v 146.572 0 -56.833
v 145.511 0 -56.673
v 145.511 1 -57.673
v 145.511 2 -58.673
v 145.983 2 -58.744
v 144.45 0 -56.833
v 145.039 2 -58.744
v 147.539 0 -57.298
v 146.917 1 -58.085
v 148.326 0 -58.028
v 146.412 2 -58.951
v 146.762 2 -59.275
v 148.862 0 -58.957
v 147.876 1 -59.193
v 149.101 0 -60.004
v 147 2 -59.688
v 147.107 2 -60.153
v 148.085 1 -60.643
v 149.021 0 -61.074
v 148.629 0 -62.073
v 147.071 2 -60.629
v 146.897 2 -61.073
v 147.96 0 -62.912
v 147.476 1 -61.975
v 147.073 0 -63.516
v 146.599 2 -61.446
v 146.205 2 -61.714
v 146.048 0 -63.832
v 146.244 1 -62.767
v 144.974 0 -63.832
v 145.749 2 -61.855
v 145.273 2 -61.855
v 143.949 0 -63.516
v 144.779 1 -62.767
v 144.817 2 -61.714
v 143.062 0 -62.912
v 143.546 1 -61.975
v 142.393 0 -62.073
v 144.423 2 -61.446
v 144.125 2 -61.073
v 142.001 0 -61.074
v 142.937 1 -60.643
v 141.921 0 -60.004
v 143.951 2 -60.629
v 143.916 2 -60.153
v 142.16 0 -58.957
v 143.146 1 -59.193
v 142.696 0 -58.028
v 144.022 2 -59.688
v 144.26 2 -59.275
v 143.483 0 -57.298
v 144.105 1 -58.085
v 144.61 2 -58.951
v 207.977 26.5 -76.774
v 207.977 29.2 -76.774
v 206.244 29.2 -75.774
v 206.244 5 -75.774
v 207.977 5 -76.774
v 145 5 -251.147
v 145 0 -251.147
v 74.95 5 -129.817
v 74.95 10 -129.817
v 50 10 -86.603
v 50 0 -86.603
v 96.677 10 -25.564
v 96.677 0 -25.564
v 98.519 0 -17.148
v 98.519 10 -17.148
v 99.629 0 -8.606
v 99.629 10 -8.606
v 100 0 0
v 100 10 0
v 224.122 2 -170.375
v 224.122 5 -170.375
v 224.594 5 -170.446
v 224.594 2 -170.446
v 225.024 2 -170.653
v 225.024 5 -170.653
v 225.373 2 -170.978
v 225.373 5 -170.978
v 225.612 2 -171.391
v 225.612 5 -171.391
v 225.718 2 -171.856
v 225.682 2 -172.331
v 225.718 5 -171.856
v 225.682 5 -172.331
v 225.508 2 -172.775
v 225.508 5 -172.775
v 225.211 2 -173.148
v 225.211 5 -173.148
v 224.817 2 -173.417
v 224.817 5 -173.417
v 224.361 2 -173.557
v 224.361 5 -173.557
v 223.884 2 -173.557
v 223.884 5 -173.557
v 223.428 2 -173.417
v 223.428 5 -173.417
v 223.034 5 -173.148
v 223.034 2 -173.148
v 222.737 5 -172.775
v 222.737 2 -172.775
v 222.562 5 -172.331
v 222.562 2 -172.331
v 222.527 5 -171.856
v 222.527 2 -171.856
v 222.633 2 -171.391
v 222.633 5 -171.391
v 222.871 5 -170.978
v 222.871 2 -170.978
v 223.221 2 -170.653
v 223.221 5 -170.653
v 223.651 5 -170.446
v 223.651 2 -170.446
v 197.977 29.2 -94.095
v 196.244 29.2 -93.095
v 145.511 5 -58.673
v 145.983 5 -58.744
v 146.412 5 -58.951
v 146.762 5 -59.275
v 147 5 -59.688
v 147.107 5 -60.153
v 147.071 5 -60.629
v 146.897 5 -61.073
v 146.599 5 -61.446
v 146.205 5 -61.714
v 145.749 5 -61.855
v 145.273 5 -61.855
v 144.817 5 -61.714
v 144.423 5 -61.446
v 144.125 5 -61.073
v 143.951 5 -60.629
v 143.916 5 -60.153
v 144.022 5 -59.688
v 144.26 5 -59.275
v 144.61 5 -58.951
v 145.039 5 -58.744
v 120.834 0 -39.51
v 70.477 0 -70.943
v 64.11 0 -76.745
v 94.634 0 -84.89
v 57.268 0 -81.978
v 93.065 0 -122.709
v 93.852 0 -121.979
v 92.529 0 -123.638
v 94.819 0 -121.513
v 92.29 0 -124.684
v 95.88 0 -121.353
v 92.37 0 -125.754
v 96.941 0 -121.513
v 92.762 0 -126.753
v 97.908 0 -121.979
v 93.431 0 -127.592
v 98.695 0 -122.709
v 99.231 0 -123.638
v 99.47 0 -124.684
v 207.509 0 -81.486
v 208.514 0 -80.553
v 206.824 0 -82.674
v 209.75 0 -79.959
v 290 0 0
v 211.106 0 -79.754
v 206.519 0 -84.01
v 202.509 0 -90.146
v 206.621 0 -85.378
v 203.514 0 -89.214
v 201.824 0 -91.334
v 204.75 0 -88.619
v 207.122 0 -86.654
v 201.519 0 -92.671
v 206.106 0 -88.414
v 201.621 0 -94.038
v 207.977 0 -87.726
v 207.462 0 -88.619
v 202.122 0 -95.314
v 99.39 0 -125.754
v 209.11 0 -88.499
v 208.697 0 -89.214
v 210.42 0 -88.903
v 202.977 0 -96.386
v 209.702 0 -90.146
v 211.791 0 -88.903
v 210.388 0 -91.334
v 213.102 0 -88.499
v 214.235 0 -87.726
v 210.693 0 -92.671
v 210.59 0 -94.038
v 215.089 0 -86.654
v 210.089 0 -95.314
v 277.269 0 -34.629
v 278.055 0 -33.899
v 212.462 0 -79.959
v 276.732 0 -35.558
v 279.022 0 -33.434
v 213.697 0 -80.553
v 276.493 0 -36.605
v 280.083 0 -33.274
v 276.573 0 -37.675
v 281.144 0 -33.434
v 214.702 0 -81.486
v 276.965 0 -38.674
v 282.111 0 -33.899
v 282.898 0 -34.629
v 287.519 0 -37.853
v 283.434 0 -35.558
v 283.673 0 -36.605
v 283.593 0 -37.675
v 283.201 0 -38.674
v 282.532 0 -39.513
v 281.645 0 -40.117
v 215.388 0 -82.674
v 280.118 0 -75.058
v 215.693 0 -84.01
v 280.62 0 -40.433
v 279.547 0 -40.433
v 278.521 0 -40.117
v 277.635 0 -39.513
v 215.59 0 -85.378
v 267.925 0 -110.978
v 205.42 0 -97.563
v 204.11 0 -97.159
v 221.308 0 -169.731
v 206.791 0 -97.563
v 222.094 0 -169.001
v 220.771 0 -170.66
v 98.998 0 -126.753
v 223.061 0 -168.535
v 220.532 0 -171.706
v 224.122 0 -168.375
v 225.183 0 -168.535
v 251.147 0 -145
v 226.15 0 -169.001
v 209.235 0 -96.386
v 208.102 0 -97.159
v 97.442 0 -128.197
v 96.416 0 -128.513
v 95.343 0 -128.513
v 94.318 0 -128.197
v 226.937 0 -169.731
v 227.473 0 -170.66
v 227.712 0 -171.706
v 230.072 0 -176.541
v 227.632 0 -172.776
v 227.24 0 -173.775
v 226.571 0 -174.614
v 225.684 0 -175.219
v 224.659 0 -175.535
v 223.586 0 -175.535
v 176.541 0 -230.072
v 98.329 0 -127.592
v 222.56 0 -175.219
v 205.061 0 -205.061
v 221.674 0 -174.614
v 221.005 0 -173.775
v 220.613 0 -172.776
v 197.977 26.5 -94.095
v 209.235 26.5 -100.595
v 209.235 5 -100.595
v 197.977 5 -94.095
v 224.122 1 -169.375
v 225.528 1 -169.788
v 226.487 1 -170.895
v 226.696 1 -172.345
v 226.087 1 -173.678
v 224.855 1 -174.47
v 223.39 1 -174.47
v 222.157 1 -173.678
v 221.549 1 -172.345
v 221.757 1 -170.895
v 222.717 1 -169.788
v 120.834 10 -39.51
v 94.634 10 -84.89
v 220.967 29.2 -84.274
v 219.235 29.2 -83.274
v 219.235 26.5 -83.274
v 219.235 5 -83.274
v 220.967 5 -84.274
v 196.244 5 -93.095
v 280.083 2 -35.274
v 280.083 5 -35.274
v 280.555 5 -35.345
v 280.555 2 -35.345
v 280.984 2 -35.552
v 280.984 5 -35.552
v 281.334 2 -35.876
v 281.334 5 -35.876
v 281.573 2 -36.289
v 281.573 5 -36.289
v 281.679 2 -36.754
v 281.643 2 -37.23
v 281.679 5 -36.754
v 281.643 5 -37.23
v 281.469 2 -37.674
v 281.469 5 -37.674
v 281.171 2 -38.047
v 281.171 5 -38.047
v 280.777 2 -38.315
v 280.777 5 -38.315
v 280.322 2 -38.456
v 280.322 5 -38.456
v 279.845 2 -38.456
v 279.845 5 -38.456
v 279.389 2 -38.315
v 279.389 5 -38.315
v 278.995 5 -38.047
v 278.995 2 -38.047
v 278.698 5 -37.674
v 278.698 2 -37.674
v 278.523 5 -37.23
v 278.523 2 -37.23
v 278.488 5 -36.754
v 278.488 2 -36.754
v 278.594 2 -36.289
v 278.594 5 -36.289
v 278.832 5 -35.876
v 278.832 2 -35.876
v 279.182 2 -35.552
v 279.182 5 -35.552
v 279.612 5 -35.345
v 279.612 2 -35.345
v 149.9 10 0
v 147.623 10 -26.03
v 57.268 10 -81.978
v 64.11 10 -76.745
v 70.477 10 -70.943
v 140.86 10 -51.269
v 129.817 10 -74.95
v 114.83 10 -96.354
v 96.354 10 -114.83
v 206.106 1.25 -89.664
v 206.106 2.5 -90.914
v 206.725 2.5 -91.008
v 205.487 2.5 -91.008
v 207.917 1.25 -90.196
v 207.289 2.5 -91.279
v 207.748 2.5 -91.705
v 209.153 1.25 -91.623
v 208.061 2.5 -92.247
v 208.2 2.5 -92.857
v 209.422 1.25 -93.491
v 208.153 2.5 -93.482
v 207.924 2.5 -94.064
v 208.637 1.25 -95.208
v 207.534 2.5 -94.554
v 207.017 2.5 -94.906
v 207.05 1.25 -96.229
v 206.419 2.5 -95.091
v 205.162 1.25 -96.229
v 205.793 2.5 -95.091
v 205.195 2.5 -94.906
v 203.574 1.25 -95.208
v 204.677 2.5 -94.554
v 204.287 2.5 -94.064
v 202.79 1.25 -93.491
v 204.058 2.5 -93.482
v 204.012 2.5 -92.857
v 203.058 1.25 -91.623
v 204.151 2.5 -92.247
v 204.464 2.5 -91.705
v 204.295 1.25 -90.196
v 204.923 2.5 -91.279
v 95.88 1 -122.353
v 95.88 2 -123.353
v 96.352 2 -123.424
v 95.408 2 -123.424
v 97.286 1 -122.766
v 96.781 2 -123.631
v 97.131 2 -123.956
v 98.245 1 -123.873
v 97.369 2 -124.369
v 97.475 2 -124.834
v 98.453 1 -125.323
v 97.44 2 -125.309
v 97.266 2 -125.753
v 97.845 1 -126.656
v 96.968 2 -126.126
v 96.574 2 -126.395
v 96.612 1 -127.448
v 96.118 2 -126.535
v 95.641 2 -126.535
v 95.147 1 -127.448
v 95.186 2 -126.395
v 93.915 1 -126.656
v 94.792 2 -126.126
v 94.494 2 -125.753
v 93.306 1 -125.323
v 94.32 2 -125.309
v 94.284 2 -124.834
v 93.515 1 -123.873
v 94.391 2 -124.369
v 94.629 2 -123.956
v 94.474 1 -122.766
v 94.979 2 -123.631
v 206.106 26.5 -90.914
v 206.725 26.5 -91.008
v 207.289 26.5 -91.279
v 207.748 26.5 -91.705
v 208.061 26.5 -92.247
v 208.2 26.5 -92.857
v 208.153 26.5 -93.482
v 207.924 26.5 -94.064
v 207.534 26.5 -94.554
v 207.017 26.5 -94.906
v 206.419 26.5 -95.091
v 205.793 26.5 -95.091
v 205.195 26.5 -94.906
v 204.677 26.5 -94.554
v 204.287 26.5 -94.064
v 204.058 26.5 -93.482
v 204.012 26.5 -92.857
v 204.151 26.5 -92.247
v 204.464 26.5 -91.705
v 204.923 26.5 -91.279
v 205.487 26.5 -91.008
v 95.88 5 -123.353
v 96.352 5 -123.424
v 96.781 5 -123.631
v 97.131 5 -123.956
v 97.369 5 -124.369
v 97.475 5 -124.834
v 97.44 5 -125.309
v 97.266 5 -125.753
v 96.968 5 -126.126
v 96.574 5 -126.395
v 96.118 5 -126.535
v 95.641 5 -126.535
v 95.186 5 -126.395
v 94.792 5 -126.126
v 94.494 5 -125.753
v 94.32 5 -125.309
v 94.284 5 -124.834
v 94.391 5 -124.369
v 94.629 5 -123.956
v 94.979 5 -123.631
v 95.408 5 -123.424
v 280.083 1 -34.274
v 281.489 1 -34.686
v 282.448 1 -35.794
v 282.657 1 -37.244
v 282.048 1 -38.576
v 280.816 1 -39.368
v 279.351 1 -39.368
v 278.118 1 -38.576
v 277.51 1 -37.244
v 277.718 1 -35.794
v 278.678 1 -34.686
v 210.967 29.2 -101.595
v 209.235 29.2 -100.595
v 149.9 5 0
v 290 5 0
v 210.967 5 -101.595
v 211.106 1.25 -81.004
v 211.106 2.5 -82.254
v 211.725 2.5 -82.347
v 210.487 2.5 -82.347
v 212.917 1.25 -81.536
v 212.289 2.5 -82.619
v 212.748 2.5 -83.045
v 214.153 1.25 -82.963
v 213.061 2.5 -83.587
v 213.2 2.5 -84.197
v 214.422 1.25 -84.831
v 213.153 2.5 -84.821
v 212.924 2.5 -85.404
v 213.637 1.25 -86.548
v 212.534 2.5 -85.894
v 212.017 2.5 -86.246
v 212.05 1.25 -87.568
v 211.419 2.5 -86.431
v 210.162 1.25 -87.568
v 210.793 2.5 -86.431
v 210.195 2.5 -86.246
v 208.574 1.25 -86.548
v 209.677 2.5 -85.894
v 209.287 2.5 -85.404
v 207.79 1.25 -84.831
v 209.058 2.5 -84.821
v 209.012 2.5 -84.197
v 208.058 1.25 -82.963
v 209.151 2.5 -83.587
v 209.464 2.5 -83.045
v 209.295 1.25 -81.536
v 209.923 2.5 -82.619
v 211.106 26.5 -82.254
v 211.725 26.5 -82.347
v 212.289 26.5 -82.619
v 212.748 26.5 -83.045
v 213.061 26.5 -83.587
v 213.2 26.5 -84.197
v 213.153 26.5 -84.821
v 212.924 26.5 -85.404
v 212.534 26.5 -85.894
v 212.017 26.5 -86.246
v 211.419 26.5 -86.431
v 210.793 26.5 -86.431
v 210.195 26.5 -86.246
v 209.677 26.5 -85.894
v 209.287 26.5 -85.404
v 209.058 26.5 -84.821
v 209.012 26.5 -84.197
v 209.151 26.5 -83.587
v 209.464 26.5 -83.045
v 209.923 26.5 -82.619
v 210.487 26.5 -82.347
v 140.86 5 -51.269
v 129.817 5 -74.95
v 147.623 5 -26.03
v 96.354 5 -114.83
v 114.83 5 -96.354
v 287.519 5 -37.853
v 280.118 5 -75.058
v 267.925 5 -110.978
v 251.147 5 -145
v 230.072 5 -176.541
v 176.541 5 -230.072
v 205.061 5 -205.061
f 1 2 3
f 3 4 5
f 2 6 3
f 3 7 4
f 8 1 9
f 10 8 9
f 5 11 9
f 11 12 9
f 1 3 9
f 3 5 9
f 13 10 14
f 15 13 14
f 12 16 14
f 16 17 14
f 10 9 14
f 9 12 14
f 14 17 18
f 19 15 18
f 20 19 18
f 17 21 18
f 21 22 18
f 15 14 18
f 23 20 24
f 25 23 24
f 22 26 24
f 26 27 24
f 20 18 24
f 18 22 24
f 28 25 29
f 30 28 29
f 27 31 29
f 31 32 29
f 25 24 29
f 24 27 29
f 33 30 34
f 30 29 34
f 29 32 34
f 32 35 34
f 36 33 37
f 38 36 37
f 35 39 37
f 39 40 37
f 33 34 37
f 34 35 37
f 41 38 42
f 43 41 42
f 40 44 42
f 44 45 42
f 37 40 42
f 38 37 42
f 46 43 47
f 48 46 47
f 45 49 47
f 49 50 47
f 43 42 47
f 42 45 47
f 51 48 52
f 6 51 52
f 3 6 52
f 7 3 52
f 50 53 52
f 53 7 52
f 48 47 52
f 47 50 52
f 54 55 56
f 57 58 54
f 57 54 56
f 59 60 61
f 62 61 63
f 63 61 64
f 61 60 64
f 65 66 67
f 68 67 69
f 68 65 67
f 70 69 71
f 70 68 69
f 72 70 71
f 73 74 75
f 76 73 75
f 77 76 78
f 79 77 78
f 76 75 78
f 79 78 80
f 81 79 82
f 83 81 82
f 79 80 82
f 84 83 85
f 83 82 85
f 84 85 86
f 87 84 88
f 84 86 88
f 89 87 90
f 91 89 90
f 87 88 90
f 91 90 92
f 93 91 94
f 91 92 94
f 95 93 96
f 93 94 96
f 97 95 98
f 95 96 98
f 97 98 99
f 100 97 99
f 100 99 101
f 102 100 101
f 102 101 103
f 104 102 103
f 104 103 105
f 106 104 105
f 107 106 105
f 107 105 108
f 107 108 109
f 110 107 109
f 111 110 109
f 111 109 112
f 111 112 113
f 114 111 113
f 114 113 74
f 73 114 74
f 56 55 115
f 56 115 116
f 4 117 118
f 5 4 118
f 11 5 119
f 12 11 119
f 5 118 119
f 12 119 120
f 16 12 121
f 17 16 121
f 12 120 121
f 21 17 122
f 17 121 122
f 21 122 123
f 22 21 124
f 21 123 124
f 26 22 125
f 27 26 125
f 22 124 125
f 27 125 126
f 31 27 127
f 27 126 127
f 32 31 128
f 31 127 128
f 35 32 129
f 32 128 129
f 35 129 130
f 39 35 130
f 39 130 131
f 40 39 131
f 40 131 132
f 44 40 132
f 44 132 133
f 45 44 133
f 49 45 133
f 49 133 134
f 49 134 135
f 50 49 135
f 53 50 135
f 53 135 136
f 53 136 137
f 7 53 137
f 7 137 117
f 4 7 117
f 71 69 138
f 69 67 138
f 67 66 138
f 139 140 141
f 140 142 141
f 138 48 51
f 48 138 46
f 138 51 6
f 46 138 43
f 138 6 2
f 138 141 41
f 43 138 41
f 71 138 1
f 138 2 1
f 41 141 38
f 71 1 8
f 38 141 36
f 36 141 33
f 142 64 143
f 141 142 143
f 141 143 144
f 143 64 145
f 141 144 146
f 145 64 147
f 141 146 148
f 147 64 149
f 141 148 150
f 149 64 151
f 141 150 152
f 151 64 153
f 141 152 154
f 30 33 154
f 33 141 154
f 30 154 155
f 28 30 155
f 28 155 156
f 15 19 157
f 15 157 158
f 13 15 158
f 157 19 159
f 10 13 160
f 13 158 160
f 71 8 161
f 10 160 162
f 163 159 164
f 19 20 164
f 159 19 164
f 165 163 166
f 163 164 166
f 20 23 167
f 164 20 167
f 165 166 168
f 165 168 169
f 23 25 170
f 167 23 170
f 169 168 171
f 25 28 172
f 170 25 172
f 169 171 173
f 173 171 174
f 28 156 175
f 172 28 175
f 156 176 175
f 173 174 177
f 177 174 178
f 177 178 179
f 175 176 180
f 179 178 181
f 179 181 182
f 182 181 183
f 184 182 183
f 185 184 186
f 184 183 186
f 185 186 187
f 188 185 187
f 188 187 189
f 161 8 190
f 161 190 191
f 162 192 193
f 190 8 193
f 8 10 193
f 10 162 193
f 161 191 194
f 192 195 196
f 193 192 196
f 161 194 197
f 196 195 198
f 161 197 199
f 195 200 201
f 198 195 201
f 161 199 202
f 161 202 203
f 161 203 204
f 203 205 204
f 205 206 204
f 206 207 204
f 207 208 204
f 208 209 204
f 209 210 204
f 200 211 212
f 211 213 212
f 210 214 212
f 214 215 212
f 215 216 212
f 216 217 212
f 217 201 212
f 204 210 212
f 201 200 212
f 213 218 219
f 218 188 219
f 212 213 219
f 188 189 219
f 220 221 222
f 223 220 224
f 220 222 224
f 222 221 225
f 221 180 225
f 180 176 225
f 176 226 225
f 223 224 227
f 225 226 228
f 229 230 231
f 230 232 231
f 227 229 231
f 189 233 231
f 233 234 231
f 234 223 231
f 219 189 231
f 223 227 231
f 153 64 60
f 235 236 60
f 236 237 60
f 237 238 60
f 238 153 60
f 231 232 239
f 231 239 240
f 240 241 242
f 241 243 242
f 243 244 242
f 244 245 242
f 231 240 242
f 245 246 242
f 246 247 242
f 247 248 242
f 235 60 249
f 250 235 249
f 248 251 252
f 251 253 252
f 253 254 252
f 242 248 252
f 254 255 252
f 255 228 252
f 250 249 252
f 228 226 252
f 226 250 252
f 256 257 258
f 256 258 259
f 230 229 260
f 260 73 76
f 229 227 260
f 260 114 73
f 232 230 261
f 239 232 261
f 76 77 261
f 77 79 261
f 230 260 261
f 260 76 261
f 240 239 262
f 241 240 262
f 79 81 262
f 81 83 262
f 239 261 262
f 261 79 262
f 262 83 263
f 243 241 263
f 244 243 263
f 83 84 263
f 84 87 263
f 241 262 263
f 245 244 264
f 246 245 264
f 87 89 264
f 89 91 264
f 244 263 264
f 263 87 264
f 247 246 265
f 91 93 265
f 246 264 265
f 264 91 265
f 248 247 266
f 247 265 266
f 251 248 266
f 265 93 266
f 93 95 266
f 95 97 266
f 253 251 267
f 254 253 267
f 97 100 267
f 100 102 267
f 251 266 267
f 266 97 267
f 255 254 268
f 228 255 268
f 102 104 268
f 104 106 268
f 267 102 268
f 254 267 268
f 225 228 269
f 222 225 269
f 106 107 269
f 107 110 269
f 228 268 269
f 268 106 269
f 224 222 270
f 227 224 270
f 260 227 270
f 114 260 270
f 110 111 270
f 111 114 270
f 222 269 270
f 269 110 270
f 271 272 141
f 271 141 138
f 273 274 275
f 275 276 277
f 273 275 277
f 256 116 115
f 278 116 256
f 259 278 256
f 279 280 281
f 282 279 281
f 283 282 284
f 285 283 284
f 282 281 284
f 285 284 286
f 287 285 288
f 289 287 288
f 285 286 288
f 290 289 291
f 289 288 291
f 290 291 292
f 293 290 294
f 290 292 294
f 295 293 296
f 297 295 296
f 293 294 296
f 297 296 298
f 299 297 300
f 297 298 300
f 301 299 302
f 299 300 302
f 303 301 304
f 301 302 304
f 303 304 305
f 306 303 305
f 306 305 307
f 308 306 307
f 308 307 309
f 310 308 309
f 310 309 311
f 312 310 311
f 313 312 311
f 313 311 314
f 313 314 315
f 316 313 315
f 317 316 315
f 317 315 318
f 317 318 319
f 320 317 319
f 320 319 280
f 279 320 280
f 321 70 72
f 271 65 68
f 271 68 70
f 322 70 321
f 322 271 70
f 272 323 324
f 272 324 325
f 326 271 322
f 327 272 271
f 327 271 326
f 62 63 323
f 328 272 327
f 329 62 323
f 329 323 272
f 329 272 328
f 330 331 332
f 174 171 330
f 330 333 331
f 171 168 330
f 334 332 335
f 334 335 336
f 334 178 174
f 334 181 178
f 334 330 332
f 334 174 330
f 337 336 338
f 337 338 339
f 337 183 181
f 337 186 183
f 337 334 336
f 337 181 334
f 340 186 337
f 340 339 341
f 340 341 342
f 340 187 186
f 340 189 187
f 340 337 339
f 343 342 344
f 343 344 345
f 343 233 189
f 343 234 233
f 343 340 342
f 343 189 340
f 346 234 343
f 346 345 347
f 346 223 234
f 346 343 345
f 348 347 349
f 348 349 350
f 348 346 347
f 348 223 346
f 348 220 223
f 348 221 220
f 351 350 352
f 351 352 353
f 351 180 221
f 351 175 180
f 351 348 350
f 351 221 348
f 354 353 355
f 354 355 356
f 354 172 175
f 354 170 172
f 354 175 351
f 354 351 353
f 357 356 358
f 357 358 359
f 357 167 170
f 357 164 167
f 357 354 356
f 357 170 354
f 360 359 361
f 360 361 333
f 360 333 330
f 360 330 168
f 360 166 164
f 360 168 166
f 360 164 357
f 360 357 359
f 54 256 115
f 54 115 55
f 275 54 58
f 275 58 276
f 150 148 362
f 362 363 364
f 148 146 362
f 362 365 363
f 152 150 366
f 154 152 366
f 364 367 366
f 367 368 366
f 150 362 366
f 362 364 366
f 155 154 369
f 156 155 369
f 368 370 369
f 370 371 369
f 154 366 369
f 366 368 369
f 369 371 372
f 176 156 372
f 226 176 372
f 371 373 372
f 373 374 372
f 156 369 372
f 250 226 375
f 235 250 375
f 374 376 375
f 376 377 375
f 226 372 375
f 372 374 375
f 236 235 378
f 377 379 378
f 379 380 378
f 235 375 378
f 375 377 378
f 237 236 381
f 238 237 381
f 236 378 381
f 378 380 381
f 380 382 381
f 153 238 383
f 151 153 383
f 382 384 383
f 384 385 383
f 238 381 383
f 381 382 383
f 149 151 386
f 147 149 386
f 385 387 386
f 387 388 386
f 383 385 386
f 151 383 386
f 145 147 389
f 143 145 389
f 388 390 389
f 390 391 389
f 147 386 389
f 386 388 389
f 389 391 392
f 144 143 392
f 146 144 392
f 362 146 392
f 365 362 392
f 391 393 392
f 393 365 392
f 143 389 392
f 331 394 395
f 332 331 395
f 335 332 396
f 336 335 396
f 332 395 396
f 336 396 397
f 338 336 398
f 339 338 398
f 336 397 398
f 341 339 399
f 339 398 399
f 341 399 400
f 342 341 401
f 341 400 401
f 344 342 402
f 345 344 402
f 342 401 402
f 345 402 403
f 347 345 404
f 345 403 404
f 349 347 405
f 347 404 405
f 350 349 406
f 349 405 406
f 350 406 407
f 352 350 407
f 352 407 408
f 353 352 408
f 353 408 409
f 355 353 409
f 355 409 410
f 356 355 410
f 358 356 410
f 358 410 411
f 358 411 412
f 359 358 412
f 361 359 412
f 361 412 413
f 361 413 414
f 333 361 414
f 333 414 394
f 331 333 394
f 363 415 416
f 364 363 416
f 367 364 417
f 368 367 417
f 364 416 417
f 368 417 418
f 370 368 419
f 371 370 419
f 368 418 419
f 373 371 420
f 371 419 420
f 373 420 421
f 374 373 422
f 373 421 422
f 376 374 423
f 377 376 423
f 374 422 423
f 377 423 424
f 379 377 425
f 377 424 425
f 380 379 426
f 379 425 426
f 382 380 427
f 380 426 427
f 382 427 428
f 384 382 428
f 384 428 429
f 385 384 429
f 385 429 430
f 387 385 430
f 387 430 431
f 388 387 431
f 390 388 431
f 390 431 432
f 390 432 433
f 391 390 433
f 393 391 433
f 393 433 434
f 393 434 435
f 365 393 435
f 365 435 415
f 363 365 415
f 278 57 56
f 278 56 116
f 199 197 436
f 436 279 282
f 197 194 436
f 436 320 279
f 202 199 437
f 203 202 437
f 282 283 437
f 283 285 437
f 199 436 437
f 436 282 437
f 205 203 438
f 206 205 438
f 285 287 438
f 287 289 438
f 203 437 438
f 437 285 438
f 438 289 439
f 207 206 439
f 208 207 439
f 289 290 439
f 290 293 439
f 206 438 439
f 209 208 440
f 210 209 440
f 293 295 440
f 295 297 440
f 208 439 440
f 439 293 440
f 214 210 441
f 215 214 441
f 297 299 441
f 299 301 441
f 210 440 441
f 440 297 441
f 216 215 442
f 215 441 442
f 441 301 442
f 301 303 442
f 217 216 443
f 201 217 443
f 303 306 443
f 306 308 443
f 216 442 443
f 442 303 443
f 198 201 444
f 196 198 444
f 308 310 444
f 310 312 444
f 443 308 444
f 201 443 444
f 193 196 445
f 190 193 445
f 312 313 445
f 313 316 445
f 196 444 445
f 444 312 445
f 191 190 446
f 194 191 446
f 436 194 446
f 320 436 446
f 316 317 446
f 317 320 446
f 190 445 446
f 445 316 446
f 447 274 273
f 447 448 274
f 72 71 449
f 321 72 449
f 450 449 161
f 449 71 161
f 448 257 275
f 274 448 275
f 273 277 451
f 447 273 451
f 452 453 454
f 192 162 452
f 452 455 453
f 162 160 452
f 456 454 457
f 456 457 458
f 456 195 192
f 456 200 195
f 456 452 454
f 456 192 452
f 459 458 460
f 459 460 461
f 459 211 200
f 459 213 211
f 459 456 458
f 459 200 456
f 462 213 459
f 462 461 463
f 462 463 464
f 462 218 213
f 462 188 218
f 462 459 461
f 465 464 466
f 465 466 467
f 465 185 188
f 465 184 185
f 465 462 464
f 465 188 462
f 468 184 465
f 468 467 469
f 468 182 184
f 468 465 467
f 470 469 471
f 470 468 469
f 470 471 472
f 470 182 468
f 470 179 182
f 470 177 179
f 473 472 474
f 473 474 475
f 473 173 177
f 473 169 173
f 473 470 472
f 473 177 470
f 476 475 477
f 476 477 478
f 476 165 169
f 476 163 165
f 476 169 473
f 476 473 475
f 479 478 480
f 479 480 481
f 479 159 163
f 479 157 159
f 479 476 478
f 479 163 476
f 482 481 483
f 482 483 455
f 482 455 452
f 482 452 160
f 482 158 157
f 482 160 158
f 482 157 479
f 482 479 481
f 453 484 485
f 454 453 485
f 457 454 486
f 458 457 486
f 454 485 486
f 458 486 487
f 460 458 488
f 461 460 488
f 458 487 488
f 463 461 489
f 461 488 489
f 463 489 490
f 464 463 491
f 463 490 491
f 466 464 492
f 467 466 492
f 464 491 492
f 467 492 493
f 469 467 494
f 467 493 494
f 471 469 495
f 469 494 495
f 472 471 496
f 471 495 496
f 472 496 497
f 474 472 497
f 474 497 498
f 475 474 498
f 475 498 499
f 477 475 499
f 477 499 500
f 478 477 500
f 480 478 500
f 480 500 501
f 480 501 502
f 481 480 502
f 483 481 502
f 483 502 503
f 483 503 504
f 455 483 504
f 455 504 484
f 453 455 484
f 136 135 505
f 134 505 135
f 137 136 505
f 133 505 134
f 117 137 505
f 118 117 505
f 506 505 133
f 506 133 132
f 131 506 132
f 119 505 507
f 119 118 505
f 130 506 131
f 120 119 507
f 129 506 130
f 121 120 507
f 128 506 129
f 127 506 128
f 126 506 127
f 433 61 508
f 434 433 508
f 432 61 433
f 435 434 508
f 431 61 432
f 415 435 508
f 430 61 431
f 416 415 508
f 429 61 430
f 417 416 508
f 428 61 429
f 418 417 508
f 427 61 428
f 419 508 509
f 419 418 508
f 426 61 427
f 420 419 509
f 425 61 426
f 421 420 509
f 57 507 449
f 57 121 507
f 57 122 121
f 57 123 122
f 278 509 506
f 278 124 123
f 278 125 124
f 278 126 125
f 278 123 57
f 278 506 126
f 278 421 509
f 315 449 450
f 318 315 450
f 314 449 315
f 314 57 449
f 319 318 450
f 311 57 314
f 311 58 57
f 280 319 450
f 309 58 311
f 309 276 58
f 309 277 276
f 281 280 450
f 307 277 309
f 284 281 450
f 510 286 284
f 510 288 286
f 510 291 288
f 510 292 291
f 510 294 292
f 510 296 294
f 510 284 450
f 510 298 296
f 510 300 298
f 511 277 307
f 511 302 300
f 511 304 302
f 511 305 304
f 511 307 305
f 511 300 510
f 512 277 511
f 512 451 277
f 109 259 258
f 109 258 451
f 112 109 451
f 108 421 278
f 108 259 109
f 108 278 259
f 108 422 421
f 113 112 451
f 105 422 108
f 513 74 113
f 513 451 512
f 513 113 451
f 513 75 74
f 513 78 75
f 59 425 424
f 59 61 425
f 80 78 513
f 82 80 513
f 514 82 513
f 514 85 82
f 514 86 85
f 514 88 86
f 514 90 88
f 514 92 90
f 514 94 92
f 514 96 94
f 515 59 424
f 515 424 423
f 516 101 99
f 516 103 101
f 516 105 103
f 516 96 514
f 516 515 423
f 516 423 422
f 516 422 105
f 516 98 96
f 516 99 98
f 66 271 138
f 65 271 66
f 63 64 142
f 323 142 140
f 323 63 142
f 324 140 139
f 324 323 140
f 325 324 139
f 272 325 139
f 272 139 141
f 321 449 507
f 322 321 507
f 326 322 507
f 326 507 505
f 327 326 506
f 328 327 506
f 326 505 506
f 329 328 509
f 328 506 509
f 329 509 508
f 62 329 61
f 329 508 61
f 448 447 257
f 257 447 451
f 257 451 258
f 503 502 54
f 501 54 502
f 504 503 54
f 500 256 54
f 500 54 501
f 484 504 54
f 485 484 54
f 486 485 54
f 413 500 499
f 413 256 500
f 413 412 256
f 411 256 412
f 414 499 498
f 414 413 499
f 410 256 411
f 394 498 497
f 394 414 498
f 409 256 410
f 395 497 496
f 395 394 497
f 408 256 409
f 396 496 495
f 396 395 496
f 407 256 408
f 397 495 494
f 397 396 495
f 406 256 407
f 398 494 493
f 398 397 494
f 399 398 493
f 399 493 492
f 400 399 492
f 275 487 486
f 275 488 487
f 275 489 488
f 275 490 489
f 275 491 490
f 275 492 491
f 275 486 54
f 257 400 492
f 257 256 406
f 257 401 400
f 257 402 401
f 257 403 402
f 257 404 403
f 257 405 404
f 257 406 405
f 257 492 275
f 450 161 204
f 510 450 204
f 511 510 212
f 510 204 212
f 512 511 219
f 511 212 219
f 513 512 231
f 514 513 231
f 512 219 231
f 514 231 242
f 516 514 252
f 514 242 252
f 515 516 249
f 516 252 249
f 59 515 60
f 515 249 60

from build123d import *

# Parameters (mm, degrees)
AUFSATZ_LINEAR_AUSTRAGEN1_DEPTH = 5
AUFSATZ_LINEAR_AUSTRAGEN2_DEPTH = 5
SCHNITT_LINEAR_AUSTRAGEN1_DEPTH = 384.76425055
SCHNITT_LINEAR_AUSTRAGEN2_DEPTH = 384.76425055
SKIZZE5_R                       = 1.6
SCHNITT_LINEAR_AUSTRAGEN3_DEPTH = 384.666521865
FASE1_SIZE                      = 2
AUFSATZ_LINEAR_AUSTRAGEN3_DEPTH = 21.5
SKIZZE7_R                       = 2.1
SCHNITT_LINEAR_AUSTRAGEN4_DEPTH = 385.548111424
AUFSATZ_LINEAR_AUSTRAGEN4_DEPTH = 24.2
FASE2_SIZE                      = 2.5


with BuildPart() as part:
    # Skizze1 → Aufsatz-Linear austragen1 (new body)
    with BuildSketch(Plane(origin=(0, 0, 0), x_dir=(1, 0, 0), z_dir=(0, 1, 0))):
        with BuildLine():
            Line((0, 0), (290, 0))
            ThreePointArc((290, 0), (251.147367097, 145), (145, 251.147367097))
            Line((145, 251.147367097), (0, 0))
        make_face()
    extrude(amount=AUFSATZ_LINEAR_AUSTRAGEN1_DEPTH)

    # Skizze2 → Aufsatz-Linear austragen2 (add)
    with BuildSketch(Plane(origin=(0, 5, 0), x_dir=(1, 0, 0), z_dir=(0, 1, 0))):
        with BuildLine():
            Line((0, 0), (149.9, 0))
            ThreePointArc((149.9, 0), (129.817208027, 74.95), (74.95, 129.817208027))
            Line((74.95, 129.817208027), (0, 0))
        make_face()
    extrude(amount=AUFSATZ_LINEAR_AUSTRAGEN2_DEPTH)

    # Skizze3 → Schnitt-Linear austragen1 (cut, through all)
    with BuildSketch(Plane(origin=(0, 10, 0), x_dir=(1, 0, 0), z_dir=(0, 1, 0))):
        Polygon((26.2, 45.379731158), (94.633560231, 84.889865579), (120.833560231, 39.510134421), (52.4, 0), (0, 0), align=None)
    extrude(amount=-SCHNITT_LINEAR_AUSTRAGEN1_DEPTH, mode=Mode.SUBTRACT)

    # Skizze4 → Schnitt-Linear austragen2 (cut, through all)
    with BuildSketch(Plane(origin=(0, 10, 0), x_dir=(1, 0, 0), z_dir=(0, 1, 0))):
        with BuildLine():
            Line((100, 0), (0, 0))
            Line((0, 0), (50, 86.602540378))
            ThreePointArc((50, 86.602540378), (86.602540378, 50), (100, 0))
        make_face()
    extrude(amount=-SCHNITT_LINEAR_AUSTRAGEN2_DEPTH, mode=Mode.SUBTRACT)

    # Skizze5 → Schnitt-Linear austragen3 (cut, through all)
    with BuildSketch(Plane(origin=(0, 5, 0), x_dir=(1, 0, 0), z_dir=(0, 1, 0))):
        with Locations(Location((95.879925069, 124.953151096, 0), (0, 0, 270))):
            Circle(SKIZZE5_R)
        with Locations(Location((224.122318632, 171.975103695, 0), (0, 0, 270))):
            Circle(SKIZZE5_R)
        with Locations(Location((145.511026371, 60.272640598, 0), (0, 0, 270))):
            Circle(SKIZZE5_R)
        with Locations(Location((280.083173338, 36.873649302, 0), (0, 0, 270))):
            Circle(SKIZZE5_R)
    extrude(amount=-SCHNITT_LINEAR_AUSTRAGEN3_DEPTH, mode=Mode.SUBTRACT)

    # Fase1
    fase1_edges = [part.edges().sort_by_distance(p)[0] for p in [
        (95.879925069, 0, -126.553151096),
        (224.122318632, 0, -173.575103695),
        (145.511026371, 0, -61.872640598),
        (280.083173338, 0, -38.473649302),
    ]]
    chamfer(fase1_edges, length=FASE1_SIZE)

    # Skizze6 → Aufsatz-Linear austragen3 (add)
    with BuildSketch(Plane(origin=(0, 5, 0), x_dir=(1, 0, 0), z_dir=(0, 1, 0))):
        Polygon((207.976550727, 76.774047358), (219.234880976, 83.274047358), (209.234880976, 100.594555434), (197.976550727, 94.094555434), align=None)
    extrude(amount=AUFSATZ_LINEAR_AUSTRAGEN3_DEPTH)

    # Skizze7 → Schnitt-Linear austragen4 (cut, through all)
    with BuildSketch(Plane(origin=(0, 26.5, 0), x_dir=(1, 0, 0), z_dir=(0, 1, 0))):
        with Locations(Location((206.105715851, 93.014428415, 0), (0, 0, 270))):
            Circle(SKIZZE7_R)
        with Locations(Location((211.105715851, 84.354174377, 0), (0, 0, 270))):
            Circle(SKIZZE7_R)
    extrude(amount=-SCHNITT_LINEAR_AUSTRAGEN4_DEPTH, mode=Mode.SUBTRACT)

    # Skizze9 → Aufsatz-Linear austragen4 (add)
    with BuildSketch(Plane(origin=(0, 5, 0), x_dir=(1, 0, 0), z_dir=(0, 1, 0))):
        Polygon((197.976550727, 94.094555434), (207.976550727, 76.774047358), (206.244499919, 75.774047358), (196.244499919, 93.094555434), align=None)
        Polygon((219.234880976, 83.274047358), (220.966931784, 84.274047358), (210.966931784, 101.594555434), (209.234880976, 100.594555434), align=None)
    extrude(amount=AUFSATZ_LINEAR_AUSTRAGEN4_DEPTH)

    # Fase2
    fase2_edges = [part.edges().sort_by_distance(p)[0] for p in [
        (206.105715851, 0, -95.114428415),
        (211.105715851, 0, -86.454174377),
    ]]
    chamfer(fase2_edges, length=FASE2_SIZE)


solid = part.part
